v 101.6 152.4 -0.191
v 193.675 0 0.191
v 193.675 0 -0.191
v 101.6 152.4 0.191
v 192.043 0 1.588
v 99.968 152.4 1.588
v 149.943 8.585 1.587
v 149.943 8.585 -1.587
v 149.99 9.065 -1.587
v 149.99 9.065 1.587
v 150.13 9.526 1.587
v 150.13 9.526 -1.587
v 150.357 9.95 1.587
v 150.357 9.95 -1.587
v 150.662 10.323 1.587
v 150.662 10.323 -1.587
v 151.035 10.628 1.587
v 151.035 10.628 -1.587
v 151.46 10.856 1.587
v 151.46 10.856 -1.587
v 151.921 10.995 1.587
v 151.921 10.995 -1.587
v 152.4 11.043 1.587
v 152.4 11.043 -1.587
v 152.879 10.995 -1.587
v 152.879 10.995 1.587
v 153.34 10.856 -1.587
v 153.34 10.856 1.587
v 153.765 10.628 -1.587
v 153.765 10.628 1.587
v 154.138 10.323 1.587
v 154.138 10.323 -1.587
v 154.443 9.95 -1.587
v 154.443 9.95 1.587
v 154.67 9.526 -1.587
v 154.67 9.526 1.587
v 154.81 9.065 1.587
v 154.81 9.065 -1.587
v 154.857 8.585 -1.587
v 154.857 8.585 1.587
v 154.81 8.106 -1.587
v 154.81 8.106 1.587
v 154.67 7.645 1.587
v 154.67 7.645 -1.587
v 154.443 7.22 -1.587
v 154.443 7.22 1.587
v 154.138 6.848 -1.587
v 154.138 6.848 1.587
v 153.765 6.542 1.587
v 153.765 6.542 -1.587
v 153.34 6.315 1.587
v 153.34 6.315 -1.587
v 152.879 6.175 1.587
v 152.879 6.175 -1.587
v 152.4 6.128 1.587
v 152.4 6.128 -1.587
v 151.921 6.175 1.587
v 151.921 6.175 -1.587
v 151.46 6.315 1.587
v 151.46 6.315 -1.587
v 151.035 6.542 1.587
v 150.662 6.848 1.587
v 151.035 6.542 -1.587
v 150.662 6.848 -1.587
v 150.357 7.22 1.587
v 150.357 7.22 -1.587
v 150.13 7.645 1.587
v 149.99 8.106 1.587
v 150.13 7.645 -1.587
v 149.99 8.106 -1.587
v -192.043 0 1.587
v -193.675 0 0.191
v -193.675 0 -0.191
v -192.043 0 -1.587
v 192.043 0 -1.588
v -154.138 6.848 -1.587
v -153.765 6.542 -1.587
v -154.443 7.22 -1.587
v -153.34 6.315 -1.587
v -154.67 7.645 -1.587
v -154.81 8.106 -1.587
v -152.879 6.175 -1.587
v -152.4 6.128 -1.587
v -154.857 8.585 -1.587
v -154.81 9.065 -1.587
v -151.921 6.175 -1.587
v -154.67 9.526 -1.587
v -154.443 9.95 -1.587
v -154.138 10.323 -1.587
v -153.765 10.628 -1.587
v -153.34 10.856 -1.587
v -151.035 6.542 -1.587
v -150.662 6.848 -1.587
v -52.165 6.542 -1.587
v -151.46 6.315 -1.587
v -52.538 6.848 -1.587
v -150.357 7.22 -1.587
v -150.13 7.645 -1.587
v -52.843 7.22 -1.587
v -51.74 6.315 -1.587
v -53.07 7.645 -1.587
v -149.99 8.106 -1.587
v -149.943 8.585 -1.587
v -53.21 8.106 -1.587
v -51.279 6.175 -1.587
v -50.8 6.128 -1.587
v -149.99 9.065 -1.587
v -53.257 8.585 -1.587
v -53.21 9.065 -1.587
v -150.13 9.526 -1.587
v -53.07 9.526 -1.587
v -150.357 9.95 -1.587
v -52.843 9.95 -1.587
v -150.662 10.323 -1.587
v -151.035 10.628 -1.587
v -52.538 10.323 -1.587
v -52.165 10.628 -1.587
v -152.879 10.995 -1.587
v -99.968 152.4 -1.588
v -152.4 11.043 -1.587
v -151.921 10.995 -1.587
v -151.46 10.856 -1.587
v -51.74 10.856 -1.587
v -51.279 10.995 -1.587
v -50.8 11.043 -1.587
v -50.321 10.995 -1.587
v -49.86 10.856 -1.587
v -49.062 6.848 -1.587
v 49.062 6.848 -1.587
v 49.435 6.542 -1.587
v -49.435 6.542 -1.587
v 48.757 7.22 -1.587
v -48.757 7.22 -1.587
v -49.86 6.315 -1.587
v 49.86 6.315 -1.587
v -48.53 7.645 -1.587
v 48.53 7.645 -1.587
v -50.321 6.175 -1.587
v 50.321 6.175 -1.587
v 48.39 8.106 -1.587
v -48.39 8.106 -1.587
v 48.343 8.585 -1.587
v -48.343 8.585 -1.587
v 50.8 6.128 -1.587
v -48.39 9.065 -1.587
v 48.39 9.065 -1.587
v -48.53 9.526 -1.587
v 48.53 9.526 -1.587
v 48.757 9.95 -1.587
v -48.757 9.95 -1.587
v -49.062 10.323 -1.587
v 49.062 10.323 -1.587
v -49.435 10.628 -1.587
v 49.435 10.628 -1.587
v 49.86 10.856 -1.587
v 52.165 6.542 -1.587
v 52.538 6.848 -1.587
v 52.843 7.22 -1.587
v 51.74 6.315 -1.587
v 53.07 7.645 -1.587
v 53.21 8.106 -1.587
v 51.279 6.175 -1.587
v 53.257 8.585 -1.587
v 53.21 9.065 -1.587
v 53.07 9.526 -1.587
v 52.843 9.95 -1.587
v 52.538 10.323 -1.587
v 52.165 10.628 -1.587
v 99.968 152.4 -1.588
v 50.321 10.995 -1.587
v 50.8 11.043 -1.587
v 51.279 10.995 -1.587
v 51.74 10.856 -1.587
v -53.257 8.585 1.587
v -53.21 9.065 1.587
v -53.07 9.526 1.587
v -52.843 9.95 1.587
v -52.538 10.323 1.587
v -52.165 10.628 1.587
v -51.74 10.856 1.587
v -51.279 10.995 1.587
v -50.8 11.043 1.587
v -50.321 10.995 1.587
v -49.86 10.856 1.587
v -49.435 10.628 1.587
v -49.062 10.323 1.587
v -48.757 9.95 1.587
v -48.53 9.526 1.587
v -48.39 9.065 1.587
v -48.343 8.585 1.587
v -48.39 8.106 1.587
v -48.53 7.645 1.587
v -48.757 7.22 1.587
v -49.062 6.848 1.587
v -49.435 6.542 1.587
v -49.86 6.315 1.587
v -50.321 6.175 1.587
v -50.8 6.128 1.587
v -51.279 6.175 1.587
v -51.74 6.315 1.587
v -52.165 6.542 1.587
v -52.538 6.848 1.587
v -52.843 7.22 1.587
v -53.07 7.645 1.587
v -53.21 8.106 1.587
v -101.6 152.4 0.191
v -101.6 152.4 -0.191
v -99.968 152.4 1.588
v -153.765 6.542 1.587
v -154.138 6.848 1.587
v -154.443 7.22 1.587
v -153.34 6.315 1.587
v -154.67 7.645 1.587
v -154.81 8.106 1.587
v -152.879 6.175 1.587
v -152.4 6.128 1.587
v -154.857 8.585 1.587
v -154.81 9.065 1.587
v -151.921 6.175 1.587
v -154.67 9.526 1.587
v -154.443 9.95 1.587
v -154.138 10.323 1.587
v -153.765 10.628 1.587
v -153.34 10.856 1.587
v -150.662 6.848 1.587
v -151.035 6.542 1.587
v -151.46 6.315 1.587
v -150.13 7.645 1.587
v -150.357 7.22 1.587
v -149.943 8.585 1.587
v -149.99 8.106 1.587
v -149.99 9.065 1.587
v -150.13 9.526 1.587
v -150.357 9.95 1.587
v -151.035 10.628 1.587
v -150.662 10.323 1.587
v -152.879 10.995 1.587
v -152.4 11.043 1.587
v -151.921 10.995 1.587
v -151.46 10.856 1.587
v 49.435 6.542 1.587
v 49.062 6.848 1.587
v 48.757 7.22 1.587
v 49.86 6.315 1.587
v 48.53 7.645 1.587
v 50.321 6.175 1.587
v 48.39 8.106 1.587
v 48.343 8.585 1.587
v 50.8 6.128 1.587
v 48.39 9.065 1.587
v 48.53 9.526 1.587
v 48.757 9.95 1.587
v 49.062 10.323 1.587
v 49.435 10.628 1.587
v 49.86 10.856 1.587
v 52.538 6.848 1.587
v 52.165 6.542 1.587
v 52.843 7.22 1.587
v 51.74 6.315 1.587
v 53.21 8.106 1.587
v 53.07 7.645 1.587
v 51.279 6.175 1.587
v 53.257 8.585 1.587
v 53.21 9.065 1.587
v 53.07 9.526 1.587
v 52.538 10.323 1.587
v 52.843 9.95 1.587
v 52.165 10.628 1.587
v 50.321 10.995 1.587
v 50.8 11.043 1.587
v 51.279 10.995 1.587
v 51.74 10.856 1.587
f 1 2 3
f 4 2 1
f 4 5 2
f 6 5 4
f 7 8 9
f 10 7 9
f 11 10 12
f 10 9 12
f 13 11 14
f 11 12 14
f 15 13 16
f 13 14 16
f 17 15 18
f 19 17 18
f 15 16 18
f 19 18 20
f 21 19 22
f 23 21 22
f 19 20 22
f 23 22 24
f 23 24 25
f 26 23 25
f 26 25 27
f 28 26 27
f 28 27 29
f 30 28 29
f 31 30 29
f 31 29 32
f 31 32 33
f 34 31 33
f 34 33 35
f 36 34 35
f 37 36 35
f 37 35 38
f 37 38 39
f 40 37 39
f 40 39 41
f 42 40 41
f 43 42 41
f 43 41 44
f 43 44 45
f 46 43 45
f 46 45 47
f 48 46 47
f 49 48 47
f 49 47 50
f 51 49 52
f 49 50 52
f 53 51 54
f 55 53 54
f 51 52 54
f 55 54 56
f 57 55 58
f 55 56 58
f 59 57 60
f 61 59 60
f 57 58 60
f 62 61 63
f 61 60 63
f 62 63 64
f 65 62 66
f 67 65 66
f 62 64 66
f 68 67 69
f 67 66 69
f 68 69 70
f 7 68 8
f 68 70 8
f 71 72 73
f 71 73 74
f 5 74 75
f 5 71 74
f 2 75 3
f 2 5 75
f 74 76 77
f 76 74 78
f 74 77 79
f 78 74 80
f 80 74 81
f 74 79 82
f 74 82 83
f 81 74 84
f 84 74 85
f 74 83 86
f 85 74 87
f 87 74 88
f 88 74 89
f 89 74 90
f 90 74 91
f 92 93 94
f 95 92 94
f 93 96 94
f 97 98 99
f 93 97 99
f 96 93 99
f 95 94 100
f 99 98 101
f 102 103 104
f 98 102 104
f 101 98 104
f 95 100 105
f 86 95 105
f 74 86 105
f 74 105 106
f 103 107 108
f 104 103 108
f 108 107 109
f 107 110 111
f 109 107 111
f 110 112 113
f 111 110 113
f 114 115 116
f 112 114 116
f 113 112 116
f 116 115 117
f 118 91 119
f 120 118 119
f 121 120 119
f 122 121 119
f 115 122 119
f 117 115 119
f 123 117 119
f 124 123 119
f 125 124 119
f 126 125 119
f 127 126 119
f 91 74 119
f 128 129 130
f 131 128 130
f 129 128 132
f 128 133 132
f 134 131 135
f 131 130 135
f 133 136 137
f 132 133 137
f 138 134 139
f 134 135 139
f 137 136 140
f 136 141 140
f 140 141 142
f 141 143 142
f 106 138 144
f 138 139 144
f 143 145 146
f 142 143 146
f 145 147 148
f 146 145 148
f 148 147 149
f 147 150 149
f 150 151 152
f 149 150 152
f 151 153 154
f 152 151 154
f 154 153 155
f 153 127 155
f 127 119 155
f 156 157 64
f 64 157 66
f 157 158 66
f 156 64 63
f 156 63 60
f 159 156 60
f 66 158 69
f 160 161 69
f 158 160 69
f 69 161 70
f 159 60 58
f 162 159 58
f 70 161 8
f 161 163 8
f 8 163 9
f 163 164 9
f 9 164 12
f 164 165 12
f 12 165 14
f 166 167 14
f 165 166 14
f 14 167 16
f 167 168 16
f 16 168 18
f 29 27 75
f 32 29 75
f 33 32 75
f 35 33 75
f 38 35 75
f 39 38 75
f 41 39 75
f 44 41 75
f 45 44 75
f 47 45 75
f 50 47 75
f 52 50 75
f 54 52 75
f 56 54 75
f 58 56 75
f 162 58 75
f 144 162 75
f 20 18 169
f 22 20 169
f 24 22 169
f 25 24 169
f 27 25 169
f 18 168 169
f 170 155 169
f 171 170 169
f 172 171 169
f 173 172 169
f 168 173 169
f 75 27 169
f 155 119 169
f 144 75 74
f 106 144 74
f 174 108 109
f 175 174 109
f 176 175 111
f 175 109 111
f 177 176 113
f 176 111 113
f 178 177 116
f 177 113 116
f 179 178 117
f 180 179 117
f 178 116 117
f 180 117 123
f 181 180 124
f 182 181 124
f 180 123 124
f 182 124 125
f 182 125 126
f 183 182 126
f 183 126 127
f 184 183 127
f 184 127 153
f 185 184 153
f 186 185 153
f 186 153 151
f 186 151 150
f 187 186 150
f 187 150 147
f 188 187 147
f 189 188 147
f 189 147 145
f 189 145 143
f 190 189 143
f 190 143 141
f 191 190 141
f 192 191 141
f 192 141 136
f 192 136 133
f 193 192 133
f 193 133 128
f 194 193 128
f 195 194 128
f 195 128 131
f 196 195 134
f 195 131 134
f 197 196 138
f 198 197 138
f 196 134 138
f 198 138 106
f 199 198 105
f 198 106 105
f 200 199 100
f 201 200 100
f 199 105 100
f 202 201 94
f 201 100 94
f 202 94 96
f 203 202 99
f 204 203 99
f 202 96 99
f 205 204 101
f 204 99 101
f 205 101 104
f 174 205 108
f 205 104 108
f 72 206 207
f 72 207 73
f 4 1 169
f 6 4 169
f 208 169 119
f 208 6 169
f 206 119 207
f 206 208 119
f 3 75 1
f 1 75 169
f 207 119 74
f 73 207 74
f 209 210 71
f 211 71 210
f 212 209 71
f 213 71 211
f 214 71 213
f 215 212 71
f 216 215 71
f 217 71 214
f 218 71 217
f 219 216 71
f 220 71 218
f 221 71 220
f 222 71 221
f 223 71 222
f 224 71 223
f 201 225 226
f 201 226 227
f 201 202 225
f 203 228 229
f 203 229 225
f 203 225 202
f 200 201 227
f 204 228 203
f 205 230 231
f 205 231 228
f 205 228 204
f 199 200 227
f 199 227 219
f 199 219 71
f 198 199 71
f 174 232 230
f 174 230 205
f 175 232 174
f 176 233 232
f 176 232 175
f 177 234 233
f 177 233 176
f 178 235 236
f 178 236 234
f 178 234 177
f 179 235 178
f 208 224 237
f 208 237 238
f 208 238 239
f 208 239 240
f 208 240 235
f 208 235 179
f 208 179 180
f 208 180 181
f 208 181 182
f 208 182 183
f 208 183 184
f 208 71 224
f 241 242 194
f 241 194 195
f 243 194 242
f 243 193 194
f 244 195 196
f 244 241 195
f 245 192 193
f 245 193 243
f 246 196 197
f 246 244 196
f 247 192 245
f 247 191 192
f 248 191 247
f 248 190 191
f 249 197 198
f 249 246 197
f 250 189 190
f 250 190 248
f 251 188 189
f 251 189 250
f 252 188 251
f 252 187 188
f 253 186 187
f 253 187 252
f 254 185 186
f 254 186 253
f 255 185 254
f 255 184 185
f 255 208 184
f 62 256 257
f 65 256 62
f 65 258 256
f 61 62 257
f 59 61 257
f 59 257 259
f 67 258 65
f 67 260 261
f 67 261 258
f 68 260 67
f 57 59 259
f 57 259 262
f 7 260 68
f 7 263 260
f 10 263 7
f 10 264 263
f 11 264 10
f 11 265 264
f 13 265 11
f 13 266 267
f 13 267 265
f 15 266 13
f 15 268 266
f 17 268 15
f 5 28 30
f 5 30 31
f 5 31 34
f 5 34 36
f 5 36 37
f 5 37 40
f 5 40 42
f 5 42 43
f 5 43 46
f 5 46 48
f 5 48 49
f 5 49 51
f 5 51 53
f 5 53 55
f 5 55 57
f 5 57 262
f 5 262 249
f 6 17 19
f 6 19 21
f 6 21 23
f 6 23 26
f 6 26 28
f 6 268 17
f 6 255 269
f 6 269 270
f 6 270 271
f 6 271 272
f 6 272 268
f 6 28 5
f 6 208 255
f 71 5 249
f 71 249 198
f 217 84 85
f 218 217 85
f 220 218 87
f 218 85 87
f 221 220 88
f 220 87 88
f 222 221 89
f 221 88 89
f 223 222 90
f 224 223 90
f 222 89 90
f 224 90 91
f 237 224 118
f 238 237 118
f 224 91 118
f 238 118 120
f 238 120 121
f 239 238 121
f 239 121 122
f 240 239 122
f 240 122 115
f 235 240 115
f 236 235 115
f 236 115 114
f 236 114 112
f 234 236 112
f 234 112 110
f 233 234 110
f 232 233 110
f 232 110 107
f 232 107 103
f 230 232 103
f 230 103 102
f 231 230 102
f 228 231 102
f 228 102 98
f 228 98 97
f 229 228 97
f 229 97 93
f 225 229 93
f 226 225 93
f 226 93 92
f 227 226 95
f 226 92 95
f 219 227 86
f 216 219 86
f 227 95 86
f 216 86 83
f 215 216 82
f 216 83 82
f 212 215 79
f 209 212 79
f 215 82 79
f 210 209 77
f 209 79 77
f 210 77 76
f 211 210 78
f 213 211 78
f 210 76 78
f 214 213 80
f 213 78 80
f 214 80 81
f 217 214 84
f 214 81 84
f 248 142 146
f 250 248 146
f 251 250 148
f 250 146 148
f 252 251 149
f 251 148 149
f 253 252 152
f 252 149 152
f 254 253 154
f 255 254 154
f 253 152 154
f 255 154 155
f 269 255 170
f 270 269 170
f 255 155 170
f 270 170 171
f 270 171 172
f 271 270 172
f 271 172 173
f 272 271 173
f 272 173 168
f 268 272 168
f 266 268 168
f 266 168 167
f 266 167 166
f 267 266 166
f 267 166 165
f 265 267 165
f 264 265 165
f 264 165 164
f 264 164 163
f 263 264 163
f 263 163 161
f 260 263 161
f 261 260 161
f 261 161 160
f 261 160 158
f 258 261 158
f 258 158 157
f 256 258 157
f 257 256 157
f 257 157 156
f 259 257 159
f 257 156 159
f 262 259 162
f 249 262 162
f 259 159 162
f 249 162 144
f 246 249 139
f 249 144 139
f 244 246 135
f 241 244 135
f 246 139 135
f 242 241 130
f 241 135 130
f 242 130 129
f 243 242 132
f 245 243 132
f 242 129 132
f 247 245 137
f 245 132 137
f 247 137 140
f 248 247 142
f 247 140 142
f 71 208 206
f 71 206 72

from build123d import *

# Parameters (mm, degrees)
EXTRUDE1_DEPTH               = 1.5875
CHAMFER1_SIZE                = 1.397
F_10_0_1935_DIAMETER_HOLE1_D = 4.9149
LPATTERN2_COUNT              = 3
LPATTERN2_PITCH              = 101.6
LPATTERN2_COL_COUNT          = 2
LPATTERN2_COL_PITCH          = 101.6


with BuildPart() as part:
    # Sketch1 → Extrude1 (new, symmetric)
    with BuildSketch(Plane.XY):
        Polygon((0, 0), (193.675, 0), (101.6, 152.4), (0, 152.4), (-101.6, 152.4), (-193.675, 0), align=None)
    extrude(amount=EXTRUDE1_DEPTH, both=True)

    # Chamfer1
    chamfer1_edges = [part.edges().sort_by_distance(p)[0] for p in [
        (147.6375, 76.2, 1.5875),
        (-147.6375, 76.2, 1.5875),
        (-147.6375, 76.2, -1.5875),
        (147.6375, 76.2, -1.5875),
    ]]
    chamfer(chamfer1_edges, length=CHAMFER1_SIZE)

    # #10 (0.1935) Diameter Hole1 (through all)
    with Locations(Plane(origin=(50.8, 8.5852, 1.5875), x_dir=(1, 0, 0), z_dir=(0, 0, 1))):
        with Locations((0, 0)):
            f_10_0_1935_diameter_hole1 = Hole(F_10_0_1935_DIAMETER_HOLE1_D / 2)

    # LPattern2: #10 (0.1935) Diameter Hole1 ×3
    with Locations(*[(-i * LPATTERN2_PITCH, 0, 0) for i in range(1, LPATTERN2_COUNT)]):
        add(f_10_0_1935_diameter_hole1, mode=Mode.SUBTRACT)

    # LPattern2 col: #10 (0.1935) Diameter Hole1 ×2
    with Locations(*[(i * LPATTERN2_COL_PITCH, 0, 0) for i in range(1, LPATTERN2_COL_COUNT)]):
        add(f_10_0_1935_diameter_hole1, mode=Mode.SUBTRACT)


solid = part.part
